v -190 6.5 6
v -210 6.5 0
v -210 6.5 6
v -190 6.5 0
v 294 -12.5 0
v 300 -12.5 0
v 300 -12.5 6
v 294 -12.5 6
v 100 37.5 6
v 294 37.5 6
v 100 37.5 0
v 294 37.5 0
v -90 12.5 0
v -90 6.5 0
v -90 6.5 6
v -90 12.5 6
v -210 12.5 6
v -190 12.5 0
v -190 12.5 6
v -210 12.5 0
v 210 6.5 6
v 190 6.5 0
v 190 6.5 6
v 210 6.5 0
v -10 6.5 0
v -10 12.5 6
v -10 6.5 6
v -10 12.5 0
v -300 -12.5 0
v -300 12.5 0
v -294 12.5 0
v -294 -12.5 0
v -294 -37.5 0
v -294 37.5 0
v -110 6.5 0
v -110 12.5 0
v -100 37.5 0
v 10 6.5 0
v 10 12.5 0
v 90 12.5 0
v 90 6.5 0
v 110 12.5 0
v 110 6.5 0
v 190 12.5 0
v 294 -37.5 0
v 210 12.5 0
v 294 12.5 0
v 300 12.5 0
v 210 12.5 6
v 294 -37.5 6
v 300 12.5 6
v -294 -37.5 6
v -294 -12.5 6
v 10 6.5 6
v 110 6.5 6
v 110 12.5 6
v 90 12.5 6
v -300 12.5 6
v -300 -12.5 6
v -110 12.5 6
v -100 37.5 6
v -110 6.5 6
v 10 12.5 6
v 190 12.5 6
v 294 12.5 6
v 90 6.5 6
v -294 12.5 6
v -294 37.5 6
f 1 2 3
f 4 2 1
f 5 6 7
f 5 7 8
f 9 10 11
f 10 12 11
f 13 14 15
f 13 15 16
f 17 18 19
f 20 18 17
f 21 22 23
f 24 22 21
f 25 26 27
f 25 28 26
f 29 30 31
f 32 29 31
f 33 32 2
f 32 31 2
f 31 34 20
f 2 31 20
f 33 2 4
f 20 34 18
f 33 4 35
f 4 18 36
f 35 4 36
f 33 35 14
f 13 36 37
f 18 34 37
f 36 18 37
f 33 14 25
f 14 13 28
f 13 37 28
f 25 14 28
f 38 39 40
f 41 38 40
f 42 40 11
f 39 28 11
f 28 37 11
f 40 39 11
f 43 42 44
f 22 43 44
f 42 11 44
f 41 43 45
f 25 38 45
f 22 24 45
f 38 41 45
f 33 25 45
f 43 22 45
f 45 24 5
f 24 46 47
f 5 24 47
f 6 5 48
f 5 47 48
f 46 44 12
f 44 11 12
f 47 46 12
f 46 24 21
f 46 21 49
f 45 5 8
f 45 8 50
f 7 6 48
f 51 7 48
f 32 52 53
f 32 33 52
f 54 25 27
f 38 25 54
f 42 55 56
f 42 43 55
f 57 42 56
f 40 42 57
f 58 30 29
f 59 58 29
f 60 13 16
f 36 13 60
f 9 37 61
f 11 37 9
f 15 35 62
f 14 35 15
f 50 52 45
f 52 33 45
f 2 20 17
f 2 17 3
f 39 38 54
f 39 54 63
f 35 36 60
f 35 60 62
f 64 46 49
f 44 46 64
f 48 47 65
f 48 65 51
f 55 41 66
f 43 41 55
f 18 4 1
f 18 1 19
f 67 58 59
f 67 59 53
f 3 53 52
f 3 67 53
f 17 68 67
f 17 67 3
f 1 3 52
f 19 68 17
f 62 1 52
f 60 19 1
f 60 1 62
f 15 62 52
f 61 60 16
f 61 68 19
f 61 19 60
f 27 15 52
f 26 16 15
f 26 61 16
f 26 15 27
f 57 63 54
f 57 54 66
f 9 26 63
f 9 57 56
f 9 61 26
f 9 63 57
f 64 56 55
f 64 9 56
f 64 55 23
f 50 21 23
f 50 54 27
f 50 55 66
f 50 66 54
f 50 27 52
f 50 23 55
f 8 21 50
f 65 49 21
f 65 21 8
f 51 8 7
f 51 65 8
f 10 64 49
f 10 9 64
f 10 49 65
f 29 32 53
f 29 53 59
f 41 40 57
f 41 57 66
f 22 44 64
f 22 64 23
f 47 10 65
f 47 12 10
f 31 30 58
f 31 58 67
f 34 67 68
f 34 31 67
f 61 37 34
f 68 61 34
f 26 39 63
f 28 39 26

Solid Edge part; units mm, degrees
sketch "Sketch1" plane through (0, 0, 0) normal (0, 0, 1) x (1, 0, 0)
  line L0 (-210, 6.5) -> (-190, 6.5)
  line L1 (-190, 6.5) -> (-190, 12.5)
  line L2 (-190, 12.5) -> (-210, 12.5)
  line L3 (-210, 12.5) -> (-210, 6.5)
  line L4 (-110, 6.5) -> (-90, 6.5)
  line L5 (-90, 6.5) -> (-90, 12.5)
  line L6 (-90, 12.5) -> (-110, 12.5)
  line L7 (-110, 12.5) -> (-110, 6.5)
  line L8 (-10, 6.5) -> (10, 6.5)
  line L9 (10, 6.5) -> (10, 12.5)
  line L10 (10, 12.5) -> (-10, 12.5)
  line L11 (-10, 12.5) -> (-10, 6.5)
  line L12 (90, 6.5) -> (110, 6.5)
  line L13 (110, 6.5) -> (110, 12.5)
  line L14 (110, 12.5) -> (90, 12.5)
  line L15 (90, 12.5) -> (90, 6.5)
  line L16 (190, 6.5) -> (210, 6.5)
  line L17 (210, 6.5) -> (210, 12.5)
  line L18 (210, 12.5) -> (190, 12.5)
  line L19 (190, 12.5) -> (190, 6.5)
  line L20 (-294, -37.5) -> (294, -37.5)
  line L21 (294, -12.5) -> (294, -37.5)
  line L22 (300, -12.5) -> (294, -12.5)
  line L23 (300, -12.5) -> (300, 12.5)
  line L24 (294, 12.5) -> (300, 12.5)
  line L25 (294, 37.5) -> (294, 12.5)
  line L26 (294, 37.5) -> (100, 37.5)
  line L27 (-100, 37.5) -> (100, 37.5)
  line L28 (-100, 37.5) -> (-294, 37.5)
  line L29 (-294, 12.5) -> (-294, 37.5)
  line L30 (-300, 12.5) -> (-294, 12.5)
  line L31 (-300, 12.5) -> (-300, -12.5)
  line L32 (-294, -12.5) -> (-300, -12.5)
  line L33 (-294, -37.5) -> (-294, -12.5)
  dimension "D1" = 20
  dimension "D2" = 6
  dimension "D3" = 20
  dimension "D4" = 6
  dimension "D5" = 20
  dimension "D6" = 6
  dimension "D7" = 20
  dimension "D8" = 6
  dimension "D9" = 25
  dimension "D10" = 84
  dimension "D11" = 25
  dimension "D12" = 25
  dimension "D13" = 25
  dimension "D14" = 80
  dimension "D15" = 80
  dimension "D16" = 84
extrude "Protrusion1" add sketch "Sketch1" along normal blind 6
